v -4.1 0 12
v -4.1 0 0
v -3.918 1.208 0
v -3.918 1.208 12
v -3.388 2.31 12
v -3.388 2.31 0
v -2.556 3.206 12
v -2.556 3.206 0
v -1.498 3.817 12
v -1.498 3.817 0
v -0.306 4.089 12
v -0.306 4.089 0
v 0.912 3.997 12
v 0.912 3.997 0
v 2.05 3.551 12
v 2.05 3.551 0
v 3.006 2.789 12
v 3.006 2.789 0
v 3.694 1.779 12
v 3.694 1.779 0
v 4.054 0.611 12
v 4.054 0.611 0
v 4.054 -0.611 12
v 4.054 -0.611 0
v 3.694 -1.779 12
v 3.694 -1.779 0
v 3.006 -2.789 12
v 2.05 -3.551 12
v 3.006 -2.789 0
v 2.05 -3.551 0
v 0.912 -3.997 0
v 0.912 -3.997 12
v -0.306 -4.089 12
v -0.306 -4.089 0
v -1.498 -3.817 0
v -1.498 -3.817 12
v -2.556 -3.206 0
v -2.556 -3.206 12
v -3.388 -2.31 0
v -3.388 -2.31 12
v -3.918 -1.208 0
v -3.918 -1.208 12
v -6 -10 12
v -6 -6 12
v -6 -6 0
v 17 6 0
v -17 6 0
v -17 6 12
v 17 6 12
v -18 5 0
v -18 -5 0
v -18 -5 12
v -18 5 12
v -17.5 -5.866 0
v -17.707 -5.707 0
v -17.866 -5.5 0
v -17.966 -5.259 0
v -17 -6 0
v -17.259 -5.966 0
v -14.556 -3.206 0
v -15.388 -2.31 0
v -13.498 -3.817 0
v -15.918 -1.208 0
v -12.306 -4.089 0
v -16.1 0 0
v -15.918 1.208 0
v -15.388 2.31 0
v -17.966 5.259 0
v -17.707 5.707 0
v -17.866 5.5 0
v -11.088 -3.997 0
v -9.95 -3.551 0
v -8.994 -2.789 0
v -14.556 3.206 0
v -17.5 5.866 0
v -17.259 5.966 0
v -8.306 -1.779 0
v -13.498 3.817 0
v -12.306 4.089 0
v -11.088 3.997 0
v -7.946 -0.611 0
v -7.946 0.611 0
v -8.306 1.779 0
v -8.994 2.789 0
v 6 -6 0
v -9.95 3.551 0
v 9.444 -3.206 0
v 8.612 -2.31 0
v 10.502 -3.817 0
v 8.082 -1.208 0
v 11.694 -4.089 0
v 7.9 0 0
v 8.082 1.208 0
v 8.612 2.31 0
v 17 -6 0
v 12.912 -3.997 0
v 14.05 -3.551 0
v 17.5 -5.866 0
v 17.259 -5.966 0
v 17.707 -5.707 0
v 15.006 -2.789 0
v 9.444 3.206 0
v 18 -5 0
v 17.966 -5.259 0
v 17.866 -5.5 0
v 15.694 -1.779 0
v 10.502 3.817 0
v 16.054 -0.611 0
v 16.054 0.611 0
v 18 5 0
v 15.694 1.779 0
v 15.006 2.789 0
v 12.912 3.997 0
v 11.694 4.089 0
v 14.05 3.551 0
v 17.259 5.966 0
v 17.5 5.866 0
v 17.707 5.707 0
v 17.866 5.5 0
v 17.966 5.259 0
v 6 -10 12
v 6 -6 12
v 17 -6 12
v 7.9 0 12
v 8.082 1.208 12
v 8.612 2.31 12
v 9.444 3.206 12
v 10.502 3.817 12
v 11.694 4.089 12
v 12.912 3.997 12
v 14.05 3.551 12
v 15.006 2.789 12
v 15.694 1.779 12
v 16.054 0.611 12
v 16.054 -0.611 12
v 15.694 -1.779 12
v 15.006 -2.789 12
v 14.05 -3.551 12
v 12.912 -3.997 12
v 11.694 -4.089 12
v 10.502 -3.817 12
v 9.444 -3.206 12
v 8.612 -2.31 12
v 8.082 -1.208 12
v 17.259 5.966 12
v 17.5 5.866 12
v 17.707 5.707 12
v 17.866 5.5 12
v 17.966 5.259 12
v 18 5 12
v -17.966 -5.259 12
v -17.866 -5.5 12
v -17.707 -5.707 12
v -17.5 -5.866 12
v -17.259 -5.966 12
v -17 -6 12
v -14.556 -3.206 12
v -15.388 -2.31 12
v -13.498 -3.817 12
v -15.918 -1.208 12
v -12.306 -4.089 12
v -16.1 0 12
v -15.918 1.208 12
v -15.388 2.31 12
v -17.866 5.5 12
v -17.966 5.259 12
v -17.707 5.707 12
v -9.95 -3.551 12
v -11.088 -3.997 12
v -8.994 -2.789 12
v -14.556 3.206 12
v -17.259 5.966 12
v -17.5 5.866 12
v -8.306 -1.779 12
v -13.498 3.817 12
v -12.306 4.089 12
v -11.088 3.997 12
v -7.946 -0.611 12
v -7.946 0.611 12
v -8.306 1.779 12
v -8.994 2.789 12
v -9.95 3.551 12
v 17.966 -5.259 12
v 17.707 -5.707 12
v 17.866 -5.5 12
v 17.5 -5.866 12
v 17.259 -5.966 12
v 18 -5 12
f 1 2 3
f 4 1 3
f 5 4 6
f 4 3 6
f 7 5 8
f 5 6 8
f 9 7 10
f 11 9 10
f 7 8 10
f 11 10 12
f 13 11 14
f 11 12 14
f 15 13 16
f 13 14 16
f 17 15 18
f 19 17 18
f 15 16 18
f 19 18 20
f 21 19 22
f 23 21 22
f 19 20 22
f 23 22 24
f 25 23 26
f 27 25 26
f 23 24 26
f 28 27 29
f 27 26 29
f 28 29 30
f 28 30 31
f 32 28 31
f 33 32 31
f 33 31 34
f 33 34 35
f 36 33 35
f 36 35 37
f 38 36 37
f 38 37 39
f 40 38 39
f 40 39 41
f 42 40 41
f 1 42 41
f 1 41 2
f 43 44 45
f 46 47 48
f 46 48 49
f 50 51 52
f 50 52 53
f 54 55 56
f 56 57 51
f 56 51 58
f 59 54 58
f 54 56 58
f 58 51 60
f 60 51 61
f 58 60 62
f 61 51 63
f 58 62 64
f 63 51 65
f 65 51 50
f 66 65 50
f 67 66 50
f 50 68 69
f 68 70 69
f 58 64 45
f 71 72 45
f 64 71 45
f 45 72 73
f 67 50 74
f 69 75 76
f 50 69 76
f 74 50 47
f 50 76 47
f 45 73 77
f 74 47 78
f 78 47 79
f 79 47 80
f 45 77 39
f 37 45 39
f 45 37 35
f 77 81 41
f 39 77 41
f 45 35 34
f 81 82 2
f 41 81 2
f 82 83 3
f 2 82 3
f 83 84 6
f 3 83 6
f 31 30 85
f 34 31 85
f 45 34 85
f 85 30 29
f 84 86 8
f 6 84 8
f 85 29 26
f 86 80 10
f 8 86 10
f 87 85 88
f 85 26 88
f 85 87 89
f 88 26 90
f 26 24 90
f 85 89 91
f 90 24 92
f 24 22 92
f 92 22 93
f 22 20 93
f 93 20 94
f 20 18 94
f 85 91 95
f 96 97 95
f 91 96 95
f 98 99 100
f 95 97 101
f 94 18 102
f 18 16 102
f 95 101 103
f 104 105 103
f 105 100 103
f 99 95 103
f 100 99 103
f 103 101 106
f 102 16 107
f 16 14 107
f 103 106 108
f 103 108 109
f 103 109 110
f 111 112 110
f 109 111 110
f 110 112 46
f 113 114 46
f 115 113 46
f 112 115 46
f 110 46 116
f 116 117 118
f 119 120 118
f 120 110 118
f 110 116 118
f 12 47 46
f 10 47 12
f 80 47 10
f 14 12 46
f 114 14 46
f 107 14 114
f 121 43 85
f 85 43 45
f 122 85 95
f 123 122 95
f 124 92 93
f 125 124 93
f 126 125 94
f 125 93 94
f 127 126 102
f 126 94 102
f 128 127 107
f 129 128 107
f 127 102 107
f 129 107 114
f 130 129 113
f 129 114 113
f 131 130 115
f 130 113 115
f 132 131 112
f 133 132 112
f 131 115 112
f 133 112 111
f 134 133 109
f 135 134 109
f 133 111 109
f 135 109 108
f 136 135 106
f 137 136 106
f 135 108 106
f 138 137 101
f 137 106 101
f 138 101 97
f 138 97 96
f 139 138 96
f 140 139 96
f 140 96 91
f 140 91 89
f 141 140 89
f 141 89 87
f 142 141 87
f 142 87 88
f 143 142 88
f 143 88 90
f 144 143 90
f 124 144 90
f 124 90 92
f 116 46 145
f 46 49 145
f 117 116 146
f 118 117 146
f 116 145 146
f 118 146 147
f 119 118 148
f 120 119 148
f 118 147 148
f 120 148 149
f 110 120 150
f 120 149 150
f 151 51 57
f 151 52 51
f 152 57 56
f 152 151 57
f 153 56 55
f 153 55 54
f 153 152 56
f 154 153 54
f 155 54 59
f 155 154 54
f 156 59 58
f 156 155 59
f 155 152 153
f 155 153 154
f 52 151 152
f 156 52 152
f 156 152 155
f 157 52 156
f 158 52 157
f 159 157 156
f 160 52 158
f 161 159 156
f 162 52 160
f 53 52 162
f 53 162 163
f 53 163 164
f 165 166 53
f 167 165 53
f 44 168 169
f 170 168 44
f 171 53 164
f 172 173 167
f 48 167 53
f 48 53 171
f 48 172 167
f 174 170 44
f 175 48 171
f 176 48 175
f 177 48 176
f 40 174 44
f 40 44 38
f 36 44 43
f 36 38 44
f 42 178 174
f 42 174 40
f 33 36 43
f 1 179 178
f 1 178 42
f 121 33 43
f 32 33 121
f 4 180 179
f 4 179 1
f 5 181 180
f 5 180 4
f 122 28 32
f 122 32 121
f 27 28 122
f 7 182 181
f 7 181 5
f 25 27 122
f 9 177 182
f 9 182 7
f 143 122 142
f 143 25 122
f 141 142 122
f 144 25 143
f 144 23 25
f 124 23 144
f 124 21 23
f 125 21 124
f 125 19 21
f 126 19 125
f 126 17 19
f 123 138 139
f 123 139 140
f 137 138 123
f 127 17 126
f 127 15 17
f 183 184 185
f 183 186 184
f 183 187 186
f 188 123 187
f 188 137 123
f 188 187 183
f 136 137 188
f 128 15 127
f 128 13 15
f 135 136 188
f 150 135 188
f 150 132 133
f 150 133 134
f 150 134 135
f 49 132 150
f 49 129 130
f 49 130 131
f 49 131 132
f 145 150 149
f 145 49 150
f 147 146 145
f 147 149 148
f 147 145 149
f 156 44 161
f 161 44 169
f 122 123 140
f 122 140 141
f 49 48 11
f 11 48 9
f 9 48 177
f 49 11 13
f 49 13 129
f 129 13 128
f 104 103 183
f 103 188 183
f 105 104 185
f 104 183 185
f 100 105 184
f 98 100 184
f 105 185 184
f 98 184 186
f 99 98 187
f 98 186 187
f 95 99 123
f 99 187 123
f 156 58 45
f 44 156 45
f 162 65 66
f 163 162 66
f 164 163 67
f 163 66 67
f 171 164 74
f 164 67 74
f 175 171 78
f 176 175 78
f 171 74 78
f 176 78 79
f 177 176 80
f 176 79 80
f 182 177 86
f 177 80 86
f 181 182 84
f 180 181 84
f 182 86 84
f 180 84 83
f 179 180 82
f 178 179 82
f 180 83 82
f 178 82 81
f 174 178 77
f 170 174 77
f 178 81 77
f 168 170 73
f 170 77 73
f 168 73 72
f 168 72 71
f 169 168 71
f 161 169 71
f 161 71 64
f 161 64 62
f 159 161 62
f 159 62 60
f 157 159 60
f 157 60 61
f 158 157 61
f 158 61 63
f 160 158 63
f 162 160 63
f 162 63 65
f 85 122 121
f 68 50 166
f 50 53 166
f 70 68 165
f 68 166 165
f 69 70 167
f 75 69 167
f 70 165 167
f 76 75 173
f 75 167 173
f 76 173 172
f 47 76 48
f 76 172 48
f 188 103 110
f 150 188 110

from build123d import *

# Parameters (mm, degrees)
SKETCH1_W             = 36
SKETCH1_H             = 12
BOSS_EXTRUDE1_DEPTH   = 12
F_3_0MM_DOWEL_HOLE1_D = 8.2
BOSS_EXTRUDE2_DEPTH   = 6
FILLET2_R             = 1


with BuildPart() as part:
    # Sketch1 → Boss-Extrude1 (new body)
    with BuildSketch(Plane.XY):
        Rectangle(SKETCH1_W, SKETCH1_H)
    extrude(amount=BOSS_EXTRUDE1_DEPTH)

    # Ø3.0mm Dowel Hole1 (through all)
    with Locations(Plane.XY.offset(12)):
        with Locations((-12, 0), (12, 0), (0, 0)):
            Hole(F_3_0MM_DOWEL_HOLE1_D / 2)

    # Sketch4 → Boss-Extrude2 (add, symmetric)
    with BuildSketch(Plane.ZY):
        Polygon((12, -6), (12, -10), (0, -6), align=None)
    extrude(amount=BOSS_EXTRUDE2_DEPTH, both=True)

    # Fillet2
    fillet2_edges = [part.edges().sort_by_distance(p)[0] for p in [
        (-18, 6, 6),
        (18, 6, 6),
        (18, -6, 6),
        (-18, -6, 6),
    ]]
    fillet(fillet2_edges, radius=FILLET2_R)


solid = part.part
